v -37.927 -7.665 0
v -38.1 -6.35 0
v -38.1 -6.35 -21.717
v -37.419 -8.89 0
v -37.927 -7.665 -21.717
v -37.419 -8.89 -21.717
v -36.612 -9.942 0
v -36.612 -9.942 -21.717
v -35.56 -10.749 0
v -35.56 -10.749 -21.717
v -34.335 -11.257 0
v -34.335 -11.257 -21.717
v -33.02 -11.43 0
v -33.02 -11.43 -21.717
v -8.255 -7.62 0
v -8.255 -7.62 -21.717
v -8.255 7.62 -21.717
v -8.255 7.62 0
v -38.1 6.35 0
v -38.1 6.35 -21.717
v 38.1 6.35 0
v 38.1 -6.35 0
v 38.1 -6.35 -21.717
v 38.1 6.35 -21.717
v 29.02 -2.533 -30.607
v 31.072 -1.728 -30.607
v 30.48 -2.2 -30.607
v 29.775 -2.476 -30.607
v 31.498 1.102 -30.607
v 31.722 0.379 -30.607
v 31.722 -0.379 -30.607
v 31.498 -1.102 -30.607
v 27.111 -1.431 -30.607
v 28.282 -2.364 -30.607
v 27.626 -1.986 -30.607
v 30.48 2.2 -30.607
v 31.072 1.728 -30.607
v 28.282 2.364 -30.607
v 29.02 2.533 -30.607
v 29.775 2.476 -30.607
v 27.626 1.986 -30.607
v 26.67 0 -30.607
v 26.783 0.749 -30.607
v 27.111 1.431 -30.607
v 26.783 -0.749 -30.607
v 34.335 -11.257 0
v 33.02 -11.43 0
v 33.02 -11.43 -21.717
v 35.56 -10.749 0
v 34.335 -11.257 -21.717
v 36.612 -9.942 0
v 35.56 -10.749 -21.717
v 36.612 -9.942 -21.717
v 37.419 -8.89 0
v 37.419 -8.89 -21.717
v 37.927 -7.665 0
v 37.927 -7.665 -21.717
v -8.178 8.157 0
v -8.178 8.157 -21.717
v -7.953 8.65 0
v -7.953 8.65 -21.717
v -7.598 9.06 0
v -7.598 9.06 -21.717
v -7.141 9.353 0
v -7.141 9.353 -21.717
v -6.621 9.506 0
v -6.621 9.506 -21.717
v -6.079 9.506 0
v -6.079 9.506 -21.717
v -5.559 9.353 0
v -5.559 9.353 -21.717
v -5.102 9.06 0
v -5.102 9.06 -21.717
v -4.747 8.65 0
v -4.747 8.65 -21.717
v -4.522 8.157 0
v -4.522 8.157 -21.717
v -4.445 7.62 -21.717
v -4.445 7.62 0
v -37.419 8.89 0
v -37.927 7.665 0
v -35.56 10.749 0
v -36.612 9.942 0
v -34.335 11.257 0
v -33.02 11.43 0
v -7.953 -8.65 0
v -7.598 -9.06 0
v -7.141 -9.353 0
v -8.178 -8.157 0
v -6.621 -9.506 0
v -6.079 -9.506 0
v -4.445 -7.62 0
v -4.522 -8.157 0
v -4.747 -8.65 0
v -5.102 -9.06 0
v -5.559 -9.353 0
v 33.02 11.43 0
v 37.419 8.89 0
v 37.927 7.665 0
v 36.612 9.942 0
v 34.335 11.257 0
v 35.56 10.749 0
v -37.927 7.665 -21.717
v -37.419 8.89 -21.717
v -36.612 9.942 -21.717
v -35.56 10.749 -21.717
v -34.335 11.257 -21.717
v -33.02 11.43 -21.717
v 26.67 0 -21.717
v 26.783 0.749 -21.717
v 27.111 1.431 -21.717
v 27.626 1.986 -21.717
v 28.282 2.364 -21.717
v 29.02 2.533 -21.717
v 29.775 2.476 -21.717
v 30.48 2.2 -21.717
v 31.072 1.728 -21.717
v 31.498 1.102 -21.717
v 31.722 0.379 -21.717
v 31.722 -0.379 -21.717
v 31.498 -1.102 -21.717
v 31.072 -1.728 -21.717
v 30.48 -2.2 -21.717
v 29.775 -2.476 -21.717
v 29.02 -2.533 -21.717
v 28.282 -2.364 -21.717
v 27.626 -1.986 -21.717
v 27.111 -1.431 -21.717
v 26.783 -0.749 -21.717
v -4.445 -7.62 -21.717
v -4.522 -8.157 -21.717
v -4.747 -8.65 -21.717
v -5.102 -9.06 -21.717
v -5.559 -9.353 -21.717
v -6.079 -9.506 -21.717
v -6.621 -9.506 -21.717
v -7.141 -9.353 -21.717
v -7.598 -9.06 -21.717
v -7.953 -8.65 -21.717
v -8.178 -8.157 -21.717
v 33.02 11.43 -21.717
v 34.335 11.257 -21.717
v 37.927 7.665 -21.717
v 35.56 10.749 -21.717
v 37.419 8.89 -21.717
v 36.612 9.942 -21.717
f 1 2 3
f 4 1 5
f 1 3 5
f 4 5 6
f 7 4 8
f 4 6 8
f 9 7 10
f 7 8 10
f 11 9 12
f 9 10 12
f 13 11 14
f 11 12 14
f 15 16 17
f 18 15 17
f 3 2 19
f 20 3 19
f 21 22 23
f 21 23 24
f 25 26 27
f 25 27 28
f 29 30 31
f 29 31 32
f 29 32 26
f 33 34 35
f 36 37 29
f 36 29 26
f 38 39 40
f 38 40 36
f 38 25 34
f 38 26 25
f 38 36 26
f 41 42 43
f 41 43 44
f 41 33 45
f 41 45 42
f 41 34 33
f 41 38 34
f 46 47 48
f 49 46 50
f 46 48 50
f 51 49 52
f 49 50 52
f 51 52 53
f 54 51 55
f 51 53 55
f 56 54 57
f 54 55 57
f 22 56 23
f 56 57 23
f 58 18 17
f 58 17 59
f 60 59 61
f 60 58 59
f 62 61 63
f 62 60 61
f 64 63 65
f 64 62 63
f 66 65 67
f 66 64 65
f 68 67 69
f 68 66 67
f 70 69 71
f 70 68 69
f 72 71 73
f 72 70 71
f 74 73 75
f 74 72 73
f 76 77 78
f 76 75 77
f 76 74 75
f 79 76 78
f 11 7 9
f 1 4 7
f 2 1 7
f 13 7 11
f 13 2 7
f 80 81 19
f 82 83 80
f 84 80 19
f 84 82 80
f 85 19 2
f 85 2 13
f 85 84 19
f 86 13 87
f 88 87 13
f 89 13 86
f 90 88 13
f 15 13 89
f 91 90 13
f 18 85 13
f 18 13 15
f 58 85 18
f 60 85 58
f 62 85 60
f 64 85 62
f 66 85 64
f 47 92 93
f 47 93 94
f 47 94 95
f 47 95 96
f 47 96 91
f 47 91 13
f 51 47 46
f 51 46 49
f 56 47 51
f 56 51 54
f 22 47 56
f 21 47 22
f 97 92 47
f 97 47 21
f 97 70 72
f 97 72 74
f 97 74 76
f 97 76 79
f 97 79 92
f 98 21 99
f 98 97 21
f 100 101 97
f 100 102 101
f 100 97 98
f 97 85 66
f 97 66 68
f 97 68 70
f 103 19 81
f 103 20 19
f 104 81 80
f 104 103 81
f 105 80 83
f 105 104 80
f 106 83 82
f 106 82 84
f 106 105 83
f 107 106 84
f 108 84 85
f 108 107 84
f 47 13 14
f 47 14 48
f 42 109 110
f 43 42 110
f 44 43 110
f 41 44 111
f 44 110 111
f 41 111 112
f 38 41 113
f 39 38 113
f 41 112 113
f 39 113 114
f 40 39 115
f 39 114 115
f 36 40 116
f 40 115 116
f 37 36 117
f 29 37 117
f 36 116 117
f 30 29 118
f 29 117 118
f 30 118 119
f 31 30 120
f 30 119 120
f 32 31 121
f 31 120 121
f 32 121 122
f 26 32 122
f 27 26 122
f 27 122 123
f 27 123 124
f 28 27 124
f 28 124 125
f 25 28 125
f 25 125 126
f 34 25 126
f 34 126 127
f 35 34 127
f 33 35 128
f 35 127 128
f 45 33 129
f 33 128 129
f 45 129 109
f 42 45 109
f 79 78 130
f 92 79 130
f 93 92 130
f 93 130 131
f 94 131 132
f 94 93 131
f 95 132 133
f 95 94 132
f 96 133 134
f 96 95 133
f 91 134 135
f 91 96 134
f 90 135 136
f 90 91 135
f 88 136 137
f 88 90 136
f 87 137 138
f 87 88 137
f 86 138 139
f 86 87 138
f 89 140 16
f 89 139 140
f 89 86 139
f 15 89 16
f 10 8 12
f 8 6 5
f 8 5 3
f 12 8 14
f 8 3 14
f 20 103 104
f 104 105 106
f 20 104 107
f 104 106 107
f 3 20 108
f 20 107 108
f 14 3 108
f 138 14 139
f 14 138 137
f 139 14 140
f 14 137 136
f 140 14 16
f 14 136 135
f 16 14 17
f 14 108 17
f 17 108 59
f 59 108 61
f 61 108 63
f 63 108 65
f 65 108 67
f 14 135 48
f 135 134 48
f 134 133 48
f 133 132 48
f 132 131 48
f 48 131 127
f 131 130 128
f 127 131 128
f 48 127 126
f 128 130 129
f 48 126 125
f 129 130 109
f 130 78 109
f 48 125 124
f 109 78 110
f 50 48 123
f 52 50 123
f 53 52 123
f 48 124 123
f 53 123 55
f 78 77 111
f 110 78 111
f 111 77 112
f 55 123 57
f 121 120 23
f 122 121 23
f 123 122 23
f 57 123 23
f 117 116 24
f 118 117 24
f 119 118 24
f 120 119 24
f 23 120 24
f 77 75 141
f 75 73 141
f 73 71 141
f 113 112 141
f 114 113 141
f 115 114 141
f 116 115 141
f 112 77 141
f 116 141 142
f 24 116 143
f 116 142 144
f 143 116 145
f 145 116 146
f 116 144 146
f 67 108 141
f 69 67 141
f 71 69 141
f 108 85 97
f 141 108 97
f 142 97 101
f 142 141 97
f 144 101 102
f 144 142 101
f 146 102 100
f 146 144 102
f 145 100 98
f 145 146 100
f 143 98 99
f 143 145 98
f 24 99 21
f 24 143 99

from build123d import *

# Parameters (mm, degrees)
SKETCH1_W           = 76.2
SKETCH1_H           = 22.86
BOSS_EXTRUDE1_DEPTH = 21.717
CUT_EXTRUDE3_REACH  = 23.717
FILLET1_R           = 5.08
SKETCH3_R           = 2.54
BOSS_EXTRUDE2_DEPTH = 8.89


with BuildPart() as part:
    # Sketch1 → Boss-Extrude1 (new body)
    with BuildSketch(Plane.XY):
        Rectangle(SKETCH1_W, SKETCH1_H)
    extrude(amount=-BOSS_EXTRUDE1_DEPTH)

    # Sketch2 → Cut-Extrude3 (cut, up to next)
    with BuildSketch(Plane.XY, mode=Mode.PRIVATE) as cut_extrude3_sk1:
        with BuildLine():
            Line((-8.255, -7.62), (-8.255, 7.62))
            ThreePointArc((-8.255, 7.62), (-6.35, 9.525), (-4.445, 7.62))
            Line((-4.445, 7.62), (-4.445, -7.62))
            ThreePointArc((-4.445, -7.62), (-6.35, -9.525), (-8.255, -7.62))
        make_face()
    cut_extrude3_tool1 = extrude(cut_extrude3_sk1.sketch, amount=-CUT_EXTRUDE3_REACH, mode=Mode.PRIVATE) & part.part
    add(cut_extrude3_tool1.solids().sort_by_distance((-6.35, 0, 0))[0], mode=Mode.SUBTRACT)

    # Fillet1
    fillet1_edges = [part.edges().sort_by_distance(p)[0] for p in [
        (38.1, -11.43, -10.8585),
        (-38.1, -11.43, -10.8585),
        (-38.1, 11.43, -10.8585),
        (38.1, 11.43, -10.8585),
    ]]
    fillet(fillet1_edges, radius=FILLET1_R)

    # Sketch3 → Boss-Extrude2 (add)
    with BuildSketch(Plane(origin=(0, 0, -21.717), x_dir=(-1, 0, 0), z_dir=(0, 0, -1))):
        with Locations((-29.21, 0)):
            Circle(SKETCH3_R)
    extrude(amount=BOSS_EXTRUDE2_DEPTH)


solid = part.part
